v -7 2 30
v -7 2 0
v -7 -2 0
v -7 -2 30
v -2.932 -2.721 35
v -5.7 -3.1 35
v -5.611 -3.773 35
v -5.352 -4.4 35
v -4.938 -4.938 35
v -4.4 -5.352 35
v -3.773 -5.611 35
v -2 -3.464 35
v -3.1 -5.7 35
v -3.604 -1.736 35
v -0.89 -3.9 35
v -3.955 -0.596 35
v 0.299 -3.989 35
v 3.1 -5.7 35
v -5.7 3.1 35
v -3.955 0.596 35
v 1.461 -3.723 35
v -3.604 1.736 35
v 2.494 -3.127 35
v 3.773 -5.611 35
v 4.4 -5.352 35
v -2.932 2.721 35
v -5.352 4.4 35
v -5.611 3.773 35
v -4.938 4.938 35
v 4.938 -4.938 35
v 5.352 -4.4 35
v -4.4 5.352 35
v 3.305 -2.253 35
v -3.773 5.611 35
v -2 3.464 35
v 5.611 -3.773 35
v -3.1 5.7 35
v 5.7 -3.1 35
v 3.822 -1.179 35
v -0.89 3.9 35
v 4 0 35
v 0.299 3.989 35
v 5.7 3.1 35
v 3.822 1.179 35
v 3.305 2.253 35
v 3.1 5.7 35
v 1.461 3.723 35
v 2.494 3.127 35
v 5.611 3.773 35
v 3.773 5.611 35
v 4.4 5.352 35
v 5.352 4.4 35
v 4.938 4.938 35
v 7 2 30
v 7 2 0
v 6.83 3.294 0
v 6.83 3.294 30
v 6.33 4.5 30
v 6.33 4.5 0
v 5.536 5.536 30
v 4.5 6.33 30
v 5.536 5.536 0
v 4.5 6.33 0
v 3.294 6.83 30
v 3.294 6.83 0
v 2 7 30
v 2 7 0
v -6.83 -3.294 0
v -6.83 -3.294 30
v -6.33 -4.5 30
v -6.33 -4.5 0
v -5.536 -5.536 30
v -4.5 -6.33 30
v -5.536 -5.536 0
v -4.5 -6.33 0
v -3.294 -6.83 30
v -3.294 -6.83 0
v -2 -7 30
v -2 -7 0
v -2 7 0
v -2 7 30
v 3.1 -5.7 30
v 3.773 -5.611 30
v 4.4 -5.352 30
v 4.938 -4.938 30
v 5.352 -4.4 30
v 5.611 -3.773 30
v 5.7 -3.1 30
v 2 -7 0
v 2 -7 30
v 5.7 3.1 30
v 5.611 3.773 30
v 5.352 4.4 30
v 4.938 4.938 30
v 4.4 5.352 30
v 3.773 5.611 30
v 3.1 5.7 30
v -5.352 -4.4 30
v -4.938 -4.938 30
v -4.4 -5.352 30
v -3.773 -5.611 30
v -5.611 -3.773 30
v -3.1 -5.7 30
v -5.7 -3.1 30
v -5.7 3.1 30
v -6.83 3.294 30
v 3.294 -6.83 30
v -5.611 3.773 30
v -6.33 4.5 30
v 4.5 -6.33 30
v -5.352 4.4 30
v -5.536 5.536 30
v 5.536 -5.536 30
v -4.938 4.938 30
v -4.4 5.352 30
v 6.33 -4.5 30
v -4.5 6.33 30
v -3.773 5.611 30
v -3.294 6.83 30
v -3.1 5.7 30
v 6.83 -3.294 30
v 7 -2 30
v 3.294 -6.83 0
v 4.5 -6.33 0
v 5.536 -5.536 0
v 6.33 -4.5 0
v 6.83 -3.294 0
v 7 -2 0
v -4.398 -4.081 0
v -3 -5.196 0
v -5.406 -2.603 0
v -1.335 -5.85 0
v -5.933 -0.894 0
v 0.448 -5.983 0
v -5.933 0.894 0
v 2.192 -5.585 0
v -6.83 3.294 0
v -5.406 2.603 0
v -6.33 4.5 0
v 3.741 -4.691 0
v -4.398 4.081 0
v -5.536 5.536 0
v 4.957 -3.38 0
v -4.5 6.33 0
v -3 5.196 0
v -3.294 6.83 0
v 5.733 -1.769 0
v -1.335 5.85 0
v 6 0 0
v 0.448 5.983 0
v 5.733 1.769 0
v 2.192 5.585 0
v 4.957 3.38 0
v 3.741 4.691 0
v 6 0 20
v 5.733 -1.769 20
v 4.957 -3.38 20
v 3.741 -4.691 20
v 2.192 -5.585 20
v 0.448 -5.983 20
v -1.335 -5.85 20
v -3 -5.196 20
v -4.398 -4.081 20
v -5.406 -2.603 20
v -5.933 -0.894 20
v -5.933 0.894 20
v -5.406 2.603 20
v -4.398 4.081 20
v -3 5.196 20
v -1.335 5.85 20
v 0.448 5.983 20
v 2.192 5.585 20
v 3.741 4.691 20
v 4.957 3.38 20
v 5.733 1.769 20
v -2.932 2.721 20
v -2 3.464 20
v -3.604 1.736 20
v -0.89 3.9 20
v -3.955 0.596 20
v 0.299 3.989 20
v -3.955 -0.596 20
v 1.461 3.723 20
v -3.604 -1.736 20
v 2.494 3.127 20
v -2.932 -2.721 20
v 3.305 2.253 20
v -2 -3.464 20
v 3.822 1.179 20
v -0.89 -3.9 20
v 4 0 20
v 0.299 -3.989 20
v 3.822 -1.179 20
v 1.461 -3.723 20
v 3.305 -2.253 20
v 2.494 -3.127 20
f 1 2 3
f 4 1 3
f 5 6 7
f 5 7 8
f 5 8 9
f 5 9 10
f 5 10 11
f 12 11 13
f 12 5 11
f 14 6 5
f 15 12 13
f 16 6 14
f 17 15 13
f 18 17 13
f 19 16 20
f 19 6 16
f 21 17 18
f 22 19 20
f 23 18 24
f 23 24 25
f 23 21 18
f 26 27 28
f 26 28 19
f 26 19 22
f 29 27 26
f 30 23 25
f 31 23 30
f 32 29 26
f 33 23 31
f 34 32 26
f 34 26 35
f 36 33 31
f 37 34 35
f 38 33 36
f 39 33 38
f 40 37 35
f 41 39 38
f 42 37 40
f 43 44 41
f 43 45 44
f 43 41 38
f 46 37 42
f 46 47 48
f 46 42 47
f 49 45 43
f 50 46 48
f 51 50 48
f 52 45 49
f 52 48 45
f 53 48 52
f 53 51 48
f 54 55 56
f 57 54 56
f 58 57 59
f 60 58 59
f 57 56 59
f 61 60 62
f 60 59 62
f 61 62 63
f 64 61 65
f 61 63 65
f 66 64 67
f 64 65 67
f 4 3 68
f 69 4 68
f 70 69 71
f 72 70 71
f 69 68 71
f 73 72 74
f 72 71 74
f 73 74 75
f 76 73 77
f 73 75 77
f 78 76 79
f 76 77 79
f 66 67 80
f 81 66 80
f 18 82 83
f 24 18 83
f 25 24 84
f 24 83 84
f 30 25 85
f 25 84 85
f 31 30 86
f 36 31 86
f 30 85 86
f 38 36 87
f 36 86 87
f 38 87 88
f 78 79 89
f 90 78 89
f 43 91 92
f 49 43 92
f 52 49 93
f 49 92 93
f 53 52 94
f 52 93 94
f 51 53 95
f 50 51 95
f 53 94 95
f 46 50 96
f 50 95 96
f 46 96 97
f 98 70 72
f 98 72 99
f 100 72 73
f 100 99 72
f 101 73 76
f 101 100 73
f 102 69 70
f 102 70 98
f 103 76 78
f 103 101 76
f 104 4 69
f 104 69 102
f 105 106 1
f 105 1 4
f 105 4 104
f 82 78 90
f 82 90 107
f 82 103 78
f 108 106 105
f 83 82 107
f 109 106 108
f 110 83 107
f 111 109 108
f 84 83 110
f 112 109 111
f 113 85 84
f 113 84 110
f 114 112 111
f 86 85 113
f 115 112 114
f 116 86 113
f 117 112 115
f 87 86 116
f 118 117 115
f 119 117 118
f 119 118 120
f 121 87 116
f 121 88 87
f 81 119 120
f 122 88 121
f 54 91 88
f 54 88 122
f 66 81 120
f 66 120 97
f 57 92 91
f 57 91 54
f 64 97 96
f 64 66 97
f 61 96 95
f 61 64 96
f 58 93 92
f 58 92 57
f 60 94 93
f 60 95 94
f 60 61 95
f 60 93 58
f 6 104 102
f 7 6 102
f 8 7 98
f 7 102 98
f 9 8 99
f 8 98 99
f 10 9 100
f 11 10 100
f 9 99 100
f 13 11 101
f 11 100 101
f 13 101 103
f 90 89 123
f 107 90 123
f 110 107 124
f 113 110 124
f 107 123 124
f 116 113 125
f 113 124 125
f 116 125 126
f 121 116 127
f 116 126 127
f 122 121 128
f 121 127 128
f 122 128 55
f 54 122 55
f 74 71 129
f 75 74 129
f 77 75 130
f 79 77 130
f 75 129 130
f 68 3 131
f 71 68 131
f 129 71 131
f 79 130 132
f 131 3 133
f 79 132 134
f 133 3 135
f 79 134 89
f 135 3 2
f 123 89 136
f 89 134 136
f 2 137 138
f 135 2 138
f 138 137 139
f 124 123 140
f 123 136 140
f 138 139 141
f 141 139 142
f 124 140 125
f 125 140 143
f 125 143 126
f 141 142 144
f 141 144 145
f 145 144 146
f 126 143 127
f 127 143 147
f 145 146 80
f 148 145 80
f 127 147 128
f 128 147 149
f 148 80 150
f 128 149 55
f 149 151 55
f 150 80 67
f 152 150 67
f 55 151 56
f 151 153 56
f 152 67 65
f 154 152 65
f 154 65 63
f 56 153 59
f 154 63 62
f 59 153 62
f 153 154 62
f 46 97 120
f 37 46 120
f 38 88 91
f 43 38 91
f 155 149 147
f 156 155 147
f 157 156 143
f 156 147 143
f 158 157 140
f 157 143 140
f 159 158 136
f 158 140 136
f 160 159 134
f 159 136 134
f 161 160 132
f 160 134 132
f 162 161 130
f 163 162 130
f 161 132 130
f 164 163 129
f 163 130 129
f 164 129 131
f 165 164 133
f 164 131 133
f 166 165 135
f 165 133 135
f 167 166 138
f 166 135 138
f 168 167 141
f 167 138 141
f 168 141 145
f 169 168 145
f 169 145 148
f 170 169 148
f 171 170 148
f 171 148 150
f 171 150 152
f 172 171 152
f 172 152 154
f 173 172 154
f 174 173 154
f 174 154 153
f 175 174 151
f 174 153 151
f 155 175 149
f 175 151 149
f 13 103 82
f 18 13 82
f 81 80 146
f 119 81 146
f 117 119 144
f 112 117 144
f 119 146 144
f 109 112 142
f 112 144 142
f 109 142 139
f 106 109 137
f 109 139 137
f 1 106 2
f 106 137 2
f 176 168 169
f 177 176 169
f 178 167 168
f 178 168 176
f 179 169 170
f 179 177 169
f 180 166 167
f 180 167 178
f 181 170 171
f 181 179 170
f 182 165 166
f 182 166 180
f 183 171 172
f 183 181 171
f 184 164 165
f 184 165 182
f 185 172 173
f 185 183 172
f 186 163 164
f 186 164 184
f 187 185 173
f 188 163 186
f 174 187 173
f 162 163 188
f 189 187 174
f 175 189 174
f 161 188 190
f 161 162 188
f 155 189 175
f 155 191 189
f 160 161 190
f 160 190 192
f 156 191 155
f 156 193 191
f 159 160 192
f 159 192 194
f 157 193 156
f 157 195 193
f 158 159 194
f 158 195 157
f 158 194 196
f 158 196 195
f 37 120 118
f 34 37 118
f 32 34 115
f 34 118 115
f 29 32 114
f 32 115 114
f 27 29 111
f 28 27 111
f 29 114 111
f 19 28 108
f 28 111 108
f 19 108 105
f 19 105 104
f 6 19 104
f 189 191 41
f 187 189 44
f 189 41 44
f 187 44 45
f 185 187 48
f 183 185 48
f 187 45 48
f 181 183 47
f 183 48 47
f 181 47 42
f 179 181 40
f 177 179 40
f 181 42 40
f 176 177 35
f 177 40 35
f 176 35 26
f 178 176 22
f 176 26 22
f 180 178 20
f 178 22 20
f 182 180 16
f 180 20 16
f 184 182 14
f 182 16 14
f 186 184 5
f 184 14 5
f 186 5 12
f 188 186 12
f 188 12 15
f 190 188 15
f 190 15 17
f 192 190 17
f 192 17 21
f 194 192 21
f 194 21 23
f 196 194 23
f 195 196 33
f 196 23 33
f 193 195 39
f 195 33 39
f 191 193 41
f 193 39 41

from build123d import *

# Parameters (mm, degrees)
F1_DEPTH = 30
F3_DEPTH = 5
F4_R     = 4
F5_DEPTH = 15
F6_R     = 6
F7_DEPTH = 20


with BuildPart() as f1:
    # F0 (on Top) → F1 (new body)
    with BuildSketch(Plane.XY):
        with BuildLine():
            ThreePointArc((7, 2), (5.535534, 5.535534), (2, 7))
            Line((2, 7), (-2, 7))
            ThreePointArc((-2, 7), (-5.535534, 5.535534), (-7, 2))
            Line((-7, 2), (-7, -2))
            ThreePointArc((-7, -2), (-5.535534, -5.535534), (-2, -7))
            Line((-2, -7), (2, -7))
            ThreePointArc((2, -7), (5.535534, -5.535534), (7, -2))
            Line((7, -2), (7, 2))
        make_face()
    extrude(amount=F1_DEPTH)

    # F2 (on face) → F3 (join)
    with BuildSketch(Plane.XY.offset(30)):
        with BuildLine():
            ThreePointArc((5.7, 3.1), (4.938478, 4.938478), (3.1, 5.7))
            Line((3.1, 5.7), (-3.1, 5.7))
            ThreePointArc((-3.1, 5.7), (-4.938478, 4.938478), (-5.7, 3.1))
            Line((-5.7, 3.1), (-5.7, -3.1))
            ThreePointArc((-5.7, -3.1), (-4.938478, -4.938478), (-3.1, -5.7))
            Line((-3.1, -5.7), (3.1, -5.7))
            ThreePointArc((3.1, -5.7), (4.938478, -4.938478), (5.7, -3.1))
            Line((5.7, -3.1), (5.7, 3.1))
        make_face()
    extrude(amount=F3_DEPTH)

    # F4 (on face) → F5 (cut)
    with BuildSketch(Plane.XY.offset(35)):
        Circle(F4_R)
    extrude(amount=-F5_DEPTH, mode=Mode.SUBTRACT)

    # F6 (on face) → F7 (cut)
    with BuildSketch(Plane(origin=(0, 0, 0), x_dir=(1, 0, 0), z_dir=(0, 0, -1))):
        Circle(F6_R)
    extrude(amount=-F7_DEPTH, mode=Mode.SUBTRACT)


solid = f1.part
